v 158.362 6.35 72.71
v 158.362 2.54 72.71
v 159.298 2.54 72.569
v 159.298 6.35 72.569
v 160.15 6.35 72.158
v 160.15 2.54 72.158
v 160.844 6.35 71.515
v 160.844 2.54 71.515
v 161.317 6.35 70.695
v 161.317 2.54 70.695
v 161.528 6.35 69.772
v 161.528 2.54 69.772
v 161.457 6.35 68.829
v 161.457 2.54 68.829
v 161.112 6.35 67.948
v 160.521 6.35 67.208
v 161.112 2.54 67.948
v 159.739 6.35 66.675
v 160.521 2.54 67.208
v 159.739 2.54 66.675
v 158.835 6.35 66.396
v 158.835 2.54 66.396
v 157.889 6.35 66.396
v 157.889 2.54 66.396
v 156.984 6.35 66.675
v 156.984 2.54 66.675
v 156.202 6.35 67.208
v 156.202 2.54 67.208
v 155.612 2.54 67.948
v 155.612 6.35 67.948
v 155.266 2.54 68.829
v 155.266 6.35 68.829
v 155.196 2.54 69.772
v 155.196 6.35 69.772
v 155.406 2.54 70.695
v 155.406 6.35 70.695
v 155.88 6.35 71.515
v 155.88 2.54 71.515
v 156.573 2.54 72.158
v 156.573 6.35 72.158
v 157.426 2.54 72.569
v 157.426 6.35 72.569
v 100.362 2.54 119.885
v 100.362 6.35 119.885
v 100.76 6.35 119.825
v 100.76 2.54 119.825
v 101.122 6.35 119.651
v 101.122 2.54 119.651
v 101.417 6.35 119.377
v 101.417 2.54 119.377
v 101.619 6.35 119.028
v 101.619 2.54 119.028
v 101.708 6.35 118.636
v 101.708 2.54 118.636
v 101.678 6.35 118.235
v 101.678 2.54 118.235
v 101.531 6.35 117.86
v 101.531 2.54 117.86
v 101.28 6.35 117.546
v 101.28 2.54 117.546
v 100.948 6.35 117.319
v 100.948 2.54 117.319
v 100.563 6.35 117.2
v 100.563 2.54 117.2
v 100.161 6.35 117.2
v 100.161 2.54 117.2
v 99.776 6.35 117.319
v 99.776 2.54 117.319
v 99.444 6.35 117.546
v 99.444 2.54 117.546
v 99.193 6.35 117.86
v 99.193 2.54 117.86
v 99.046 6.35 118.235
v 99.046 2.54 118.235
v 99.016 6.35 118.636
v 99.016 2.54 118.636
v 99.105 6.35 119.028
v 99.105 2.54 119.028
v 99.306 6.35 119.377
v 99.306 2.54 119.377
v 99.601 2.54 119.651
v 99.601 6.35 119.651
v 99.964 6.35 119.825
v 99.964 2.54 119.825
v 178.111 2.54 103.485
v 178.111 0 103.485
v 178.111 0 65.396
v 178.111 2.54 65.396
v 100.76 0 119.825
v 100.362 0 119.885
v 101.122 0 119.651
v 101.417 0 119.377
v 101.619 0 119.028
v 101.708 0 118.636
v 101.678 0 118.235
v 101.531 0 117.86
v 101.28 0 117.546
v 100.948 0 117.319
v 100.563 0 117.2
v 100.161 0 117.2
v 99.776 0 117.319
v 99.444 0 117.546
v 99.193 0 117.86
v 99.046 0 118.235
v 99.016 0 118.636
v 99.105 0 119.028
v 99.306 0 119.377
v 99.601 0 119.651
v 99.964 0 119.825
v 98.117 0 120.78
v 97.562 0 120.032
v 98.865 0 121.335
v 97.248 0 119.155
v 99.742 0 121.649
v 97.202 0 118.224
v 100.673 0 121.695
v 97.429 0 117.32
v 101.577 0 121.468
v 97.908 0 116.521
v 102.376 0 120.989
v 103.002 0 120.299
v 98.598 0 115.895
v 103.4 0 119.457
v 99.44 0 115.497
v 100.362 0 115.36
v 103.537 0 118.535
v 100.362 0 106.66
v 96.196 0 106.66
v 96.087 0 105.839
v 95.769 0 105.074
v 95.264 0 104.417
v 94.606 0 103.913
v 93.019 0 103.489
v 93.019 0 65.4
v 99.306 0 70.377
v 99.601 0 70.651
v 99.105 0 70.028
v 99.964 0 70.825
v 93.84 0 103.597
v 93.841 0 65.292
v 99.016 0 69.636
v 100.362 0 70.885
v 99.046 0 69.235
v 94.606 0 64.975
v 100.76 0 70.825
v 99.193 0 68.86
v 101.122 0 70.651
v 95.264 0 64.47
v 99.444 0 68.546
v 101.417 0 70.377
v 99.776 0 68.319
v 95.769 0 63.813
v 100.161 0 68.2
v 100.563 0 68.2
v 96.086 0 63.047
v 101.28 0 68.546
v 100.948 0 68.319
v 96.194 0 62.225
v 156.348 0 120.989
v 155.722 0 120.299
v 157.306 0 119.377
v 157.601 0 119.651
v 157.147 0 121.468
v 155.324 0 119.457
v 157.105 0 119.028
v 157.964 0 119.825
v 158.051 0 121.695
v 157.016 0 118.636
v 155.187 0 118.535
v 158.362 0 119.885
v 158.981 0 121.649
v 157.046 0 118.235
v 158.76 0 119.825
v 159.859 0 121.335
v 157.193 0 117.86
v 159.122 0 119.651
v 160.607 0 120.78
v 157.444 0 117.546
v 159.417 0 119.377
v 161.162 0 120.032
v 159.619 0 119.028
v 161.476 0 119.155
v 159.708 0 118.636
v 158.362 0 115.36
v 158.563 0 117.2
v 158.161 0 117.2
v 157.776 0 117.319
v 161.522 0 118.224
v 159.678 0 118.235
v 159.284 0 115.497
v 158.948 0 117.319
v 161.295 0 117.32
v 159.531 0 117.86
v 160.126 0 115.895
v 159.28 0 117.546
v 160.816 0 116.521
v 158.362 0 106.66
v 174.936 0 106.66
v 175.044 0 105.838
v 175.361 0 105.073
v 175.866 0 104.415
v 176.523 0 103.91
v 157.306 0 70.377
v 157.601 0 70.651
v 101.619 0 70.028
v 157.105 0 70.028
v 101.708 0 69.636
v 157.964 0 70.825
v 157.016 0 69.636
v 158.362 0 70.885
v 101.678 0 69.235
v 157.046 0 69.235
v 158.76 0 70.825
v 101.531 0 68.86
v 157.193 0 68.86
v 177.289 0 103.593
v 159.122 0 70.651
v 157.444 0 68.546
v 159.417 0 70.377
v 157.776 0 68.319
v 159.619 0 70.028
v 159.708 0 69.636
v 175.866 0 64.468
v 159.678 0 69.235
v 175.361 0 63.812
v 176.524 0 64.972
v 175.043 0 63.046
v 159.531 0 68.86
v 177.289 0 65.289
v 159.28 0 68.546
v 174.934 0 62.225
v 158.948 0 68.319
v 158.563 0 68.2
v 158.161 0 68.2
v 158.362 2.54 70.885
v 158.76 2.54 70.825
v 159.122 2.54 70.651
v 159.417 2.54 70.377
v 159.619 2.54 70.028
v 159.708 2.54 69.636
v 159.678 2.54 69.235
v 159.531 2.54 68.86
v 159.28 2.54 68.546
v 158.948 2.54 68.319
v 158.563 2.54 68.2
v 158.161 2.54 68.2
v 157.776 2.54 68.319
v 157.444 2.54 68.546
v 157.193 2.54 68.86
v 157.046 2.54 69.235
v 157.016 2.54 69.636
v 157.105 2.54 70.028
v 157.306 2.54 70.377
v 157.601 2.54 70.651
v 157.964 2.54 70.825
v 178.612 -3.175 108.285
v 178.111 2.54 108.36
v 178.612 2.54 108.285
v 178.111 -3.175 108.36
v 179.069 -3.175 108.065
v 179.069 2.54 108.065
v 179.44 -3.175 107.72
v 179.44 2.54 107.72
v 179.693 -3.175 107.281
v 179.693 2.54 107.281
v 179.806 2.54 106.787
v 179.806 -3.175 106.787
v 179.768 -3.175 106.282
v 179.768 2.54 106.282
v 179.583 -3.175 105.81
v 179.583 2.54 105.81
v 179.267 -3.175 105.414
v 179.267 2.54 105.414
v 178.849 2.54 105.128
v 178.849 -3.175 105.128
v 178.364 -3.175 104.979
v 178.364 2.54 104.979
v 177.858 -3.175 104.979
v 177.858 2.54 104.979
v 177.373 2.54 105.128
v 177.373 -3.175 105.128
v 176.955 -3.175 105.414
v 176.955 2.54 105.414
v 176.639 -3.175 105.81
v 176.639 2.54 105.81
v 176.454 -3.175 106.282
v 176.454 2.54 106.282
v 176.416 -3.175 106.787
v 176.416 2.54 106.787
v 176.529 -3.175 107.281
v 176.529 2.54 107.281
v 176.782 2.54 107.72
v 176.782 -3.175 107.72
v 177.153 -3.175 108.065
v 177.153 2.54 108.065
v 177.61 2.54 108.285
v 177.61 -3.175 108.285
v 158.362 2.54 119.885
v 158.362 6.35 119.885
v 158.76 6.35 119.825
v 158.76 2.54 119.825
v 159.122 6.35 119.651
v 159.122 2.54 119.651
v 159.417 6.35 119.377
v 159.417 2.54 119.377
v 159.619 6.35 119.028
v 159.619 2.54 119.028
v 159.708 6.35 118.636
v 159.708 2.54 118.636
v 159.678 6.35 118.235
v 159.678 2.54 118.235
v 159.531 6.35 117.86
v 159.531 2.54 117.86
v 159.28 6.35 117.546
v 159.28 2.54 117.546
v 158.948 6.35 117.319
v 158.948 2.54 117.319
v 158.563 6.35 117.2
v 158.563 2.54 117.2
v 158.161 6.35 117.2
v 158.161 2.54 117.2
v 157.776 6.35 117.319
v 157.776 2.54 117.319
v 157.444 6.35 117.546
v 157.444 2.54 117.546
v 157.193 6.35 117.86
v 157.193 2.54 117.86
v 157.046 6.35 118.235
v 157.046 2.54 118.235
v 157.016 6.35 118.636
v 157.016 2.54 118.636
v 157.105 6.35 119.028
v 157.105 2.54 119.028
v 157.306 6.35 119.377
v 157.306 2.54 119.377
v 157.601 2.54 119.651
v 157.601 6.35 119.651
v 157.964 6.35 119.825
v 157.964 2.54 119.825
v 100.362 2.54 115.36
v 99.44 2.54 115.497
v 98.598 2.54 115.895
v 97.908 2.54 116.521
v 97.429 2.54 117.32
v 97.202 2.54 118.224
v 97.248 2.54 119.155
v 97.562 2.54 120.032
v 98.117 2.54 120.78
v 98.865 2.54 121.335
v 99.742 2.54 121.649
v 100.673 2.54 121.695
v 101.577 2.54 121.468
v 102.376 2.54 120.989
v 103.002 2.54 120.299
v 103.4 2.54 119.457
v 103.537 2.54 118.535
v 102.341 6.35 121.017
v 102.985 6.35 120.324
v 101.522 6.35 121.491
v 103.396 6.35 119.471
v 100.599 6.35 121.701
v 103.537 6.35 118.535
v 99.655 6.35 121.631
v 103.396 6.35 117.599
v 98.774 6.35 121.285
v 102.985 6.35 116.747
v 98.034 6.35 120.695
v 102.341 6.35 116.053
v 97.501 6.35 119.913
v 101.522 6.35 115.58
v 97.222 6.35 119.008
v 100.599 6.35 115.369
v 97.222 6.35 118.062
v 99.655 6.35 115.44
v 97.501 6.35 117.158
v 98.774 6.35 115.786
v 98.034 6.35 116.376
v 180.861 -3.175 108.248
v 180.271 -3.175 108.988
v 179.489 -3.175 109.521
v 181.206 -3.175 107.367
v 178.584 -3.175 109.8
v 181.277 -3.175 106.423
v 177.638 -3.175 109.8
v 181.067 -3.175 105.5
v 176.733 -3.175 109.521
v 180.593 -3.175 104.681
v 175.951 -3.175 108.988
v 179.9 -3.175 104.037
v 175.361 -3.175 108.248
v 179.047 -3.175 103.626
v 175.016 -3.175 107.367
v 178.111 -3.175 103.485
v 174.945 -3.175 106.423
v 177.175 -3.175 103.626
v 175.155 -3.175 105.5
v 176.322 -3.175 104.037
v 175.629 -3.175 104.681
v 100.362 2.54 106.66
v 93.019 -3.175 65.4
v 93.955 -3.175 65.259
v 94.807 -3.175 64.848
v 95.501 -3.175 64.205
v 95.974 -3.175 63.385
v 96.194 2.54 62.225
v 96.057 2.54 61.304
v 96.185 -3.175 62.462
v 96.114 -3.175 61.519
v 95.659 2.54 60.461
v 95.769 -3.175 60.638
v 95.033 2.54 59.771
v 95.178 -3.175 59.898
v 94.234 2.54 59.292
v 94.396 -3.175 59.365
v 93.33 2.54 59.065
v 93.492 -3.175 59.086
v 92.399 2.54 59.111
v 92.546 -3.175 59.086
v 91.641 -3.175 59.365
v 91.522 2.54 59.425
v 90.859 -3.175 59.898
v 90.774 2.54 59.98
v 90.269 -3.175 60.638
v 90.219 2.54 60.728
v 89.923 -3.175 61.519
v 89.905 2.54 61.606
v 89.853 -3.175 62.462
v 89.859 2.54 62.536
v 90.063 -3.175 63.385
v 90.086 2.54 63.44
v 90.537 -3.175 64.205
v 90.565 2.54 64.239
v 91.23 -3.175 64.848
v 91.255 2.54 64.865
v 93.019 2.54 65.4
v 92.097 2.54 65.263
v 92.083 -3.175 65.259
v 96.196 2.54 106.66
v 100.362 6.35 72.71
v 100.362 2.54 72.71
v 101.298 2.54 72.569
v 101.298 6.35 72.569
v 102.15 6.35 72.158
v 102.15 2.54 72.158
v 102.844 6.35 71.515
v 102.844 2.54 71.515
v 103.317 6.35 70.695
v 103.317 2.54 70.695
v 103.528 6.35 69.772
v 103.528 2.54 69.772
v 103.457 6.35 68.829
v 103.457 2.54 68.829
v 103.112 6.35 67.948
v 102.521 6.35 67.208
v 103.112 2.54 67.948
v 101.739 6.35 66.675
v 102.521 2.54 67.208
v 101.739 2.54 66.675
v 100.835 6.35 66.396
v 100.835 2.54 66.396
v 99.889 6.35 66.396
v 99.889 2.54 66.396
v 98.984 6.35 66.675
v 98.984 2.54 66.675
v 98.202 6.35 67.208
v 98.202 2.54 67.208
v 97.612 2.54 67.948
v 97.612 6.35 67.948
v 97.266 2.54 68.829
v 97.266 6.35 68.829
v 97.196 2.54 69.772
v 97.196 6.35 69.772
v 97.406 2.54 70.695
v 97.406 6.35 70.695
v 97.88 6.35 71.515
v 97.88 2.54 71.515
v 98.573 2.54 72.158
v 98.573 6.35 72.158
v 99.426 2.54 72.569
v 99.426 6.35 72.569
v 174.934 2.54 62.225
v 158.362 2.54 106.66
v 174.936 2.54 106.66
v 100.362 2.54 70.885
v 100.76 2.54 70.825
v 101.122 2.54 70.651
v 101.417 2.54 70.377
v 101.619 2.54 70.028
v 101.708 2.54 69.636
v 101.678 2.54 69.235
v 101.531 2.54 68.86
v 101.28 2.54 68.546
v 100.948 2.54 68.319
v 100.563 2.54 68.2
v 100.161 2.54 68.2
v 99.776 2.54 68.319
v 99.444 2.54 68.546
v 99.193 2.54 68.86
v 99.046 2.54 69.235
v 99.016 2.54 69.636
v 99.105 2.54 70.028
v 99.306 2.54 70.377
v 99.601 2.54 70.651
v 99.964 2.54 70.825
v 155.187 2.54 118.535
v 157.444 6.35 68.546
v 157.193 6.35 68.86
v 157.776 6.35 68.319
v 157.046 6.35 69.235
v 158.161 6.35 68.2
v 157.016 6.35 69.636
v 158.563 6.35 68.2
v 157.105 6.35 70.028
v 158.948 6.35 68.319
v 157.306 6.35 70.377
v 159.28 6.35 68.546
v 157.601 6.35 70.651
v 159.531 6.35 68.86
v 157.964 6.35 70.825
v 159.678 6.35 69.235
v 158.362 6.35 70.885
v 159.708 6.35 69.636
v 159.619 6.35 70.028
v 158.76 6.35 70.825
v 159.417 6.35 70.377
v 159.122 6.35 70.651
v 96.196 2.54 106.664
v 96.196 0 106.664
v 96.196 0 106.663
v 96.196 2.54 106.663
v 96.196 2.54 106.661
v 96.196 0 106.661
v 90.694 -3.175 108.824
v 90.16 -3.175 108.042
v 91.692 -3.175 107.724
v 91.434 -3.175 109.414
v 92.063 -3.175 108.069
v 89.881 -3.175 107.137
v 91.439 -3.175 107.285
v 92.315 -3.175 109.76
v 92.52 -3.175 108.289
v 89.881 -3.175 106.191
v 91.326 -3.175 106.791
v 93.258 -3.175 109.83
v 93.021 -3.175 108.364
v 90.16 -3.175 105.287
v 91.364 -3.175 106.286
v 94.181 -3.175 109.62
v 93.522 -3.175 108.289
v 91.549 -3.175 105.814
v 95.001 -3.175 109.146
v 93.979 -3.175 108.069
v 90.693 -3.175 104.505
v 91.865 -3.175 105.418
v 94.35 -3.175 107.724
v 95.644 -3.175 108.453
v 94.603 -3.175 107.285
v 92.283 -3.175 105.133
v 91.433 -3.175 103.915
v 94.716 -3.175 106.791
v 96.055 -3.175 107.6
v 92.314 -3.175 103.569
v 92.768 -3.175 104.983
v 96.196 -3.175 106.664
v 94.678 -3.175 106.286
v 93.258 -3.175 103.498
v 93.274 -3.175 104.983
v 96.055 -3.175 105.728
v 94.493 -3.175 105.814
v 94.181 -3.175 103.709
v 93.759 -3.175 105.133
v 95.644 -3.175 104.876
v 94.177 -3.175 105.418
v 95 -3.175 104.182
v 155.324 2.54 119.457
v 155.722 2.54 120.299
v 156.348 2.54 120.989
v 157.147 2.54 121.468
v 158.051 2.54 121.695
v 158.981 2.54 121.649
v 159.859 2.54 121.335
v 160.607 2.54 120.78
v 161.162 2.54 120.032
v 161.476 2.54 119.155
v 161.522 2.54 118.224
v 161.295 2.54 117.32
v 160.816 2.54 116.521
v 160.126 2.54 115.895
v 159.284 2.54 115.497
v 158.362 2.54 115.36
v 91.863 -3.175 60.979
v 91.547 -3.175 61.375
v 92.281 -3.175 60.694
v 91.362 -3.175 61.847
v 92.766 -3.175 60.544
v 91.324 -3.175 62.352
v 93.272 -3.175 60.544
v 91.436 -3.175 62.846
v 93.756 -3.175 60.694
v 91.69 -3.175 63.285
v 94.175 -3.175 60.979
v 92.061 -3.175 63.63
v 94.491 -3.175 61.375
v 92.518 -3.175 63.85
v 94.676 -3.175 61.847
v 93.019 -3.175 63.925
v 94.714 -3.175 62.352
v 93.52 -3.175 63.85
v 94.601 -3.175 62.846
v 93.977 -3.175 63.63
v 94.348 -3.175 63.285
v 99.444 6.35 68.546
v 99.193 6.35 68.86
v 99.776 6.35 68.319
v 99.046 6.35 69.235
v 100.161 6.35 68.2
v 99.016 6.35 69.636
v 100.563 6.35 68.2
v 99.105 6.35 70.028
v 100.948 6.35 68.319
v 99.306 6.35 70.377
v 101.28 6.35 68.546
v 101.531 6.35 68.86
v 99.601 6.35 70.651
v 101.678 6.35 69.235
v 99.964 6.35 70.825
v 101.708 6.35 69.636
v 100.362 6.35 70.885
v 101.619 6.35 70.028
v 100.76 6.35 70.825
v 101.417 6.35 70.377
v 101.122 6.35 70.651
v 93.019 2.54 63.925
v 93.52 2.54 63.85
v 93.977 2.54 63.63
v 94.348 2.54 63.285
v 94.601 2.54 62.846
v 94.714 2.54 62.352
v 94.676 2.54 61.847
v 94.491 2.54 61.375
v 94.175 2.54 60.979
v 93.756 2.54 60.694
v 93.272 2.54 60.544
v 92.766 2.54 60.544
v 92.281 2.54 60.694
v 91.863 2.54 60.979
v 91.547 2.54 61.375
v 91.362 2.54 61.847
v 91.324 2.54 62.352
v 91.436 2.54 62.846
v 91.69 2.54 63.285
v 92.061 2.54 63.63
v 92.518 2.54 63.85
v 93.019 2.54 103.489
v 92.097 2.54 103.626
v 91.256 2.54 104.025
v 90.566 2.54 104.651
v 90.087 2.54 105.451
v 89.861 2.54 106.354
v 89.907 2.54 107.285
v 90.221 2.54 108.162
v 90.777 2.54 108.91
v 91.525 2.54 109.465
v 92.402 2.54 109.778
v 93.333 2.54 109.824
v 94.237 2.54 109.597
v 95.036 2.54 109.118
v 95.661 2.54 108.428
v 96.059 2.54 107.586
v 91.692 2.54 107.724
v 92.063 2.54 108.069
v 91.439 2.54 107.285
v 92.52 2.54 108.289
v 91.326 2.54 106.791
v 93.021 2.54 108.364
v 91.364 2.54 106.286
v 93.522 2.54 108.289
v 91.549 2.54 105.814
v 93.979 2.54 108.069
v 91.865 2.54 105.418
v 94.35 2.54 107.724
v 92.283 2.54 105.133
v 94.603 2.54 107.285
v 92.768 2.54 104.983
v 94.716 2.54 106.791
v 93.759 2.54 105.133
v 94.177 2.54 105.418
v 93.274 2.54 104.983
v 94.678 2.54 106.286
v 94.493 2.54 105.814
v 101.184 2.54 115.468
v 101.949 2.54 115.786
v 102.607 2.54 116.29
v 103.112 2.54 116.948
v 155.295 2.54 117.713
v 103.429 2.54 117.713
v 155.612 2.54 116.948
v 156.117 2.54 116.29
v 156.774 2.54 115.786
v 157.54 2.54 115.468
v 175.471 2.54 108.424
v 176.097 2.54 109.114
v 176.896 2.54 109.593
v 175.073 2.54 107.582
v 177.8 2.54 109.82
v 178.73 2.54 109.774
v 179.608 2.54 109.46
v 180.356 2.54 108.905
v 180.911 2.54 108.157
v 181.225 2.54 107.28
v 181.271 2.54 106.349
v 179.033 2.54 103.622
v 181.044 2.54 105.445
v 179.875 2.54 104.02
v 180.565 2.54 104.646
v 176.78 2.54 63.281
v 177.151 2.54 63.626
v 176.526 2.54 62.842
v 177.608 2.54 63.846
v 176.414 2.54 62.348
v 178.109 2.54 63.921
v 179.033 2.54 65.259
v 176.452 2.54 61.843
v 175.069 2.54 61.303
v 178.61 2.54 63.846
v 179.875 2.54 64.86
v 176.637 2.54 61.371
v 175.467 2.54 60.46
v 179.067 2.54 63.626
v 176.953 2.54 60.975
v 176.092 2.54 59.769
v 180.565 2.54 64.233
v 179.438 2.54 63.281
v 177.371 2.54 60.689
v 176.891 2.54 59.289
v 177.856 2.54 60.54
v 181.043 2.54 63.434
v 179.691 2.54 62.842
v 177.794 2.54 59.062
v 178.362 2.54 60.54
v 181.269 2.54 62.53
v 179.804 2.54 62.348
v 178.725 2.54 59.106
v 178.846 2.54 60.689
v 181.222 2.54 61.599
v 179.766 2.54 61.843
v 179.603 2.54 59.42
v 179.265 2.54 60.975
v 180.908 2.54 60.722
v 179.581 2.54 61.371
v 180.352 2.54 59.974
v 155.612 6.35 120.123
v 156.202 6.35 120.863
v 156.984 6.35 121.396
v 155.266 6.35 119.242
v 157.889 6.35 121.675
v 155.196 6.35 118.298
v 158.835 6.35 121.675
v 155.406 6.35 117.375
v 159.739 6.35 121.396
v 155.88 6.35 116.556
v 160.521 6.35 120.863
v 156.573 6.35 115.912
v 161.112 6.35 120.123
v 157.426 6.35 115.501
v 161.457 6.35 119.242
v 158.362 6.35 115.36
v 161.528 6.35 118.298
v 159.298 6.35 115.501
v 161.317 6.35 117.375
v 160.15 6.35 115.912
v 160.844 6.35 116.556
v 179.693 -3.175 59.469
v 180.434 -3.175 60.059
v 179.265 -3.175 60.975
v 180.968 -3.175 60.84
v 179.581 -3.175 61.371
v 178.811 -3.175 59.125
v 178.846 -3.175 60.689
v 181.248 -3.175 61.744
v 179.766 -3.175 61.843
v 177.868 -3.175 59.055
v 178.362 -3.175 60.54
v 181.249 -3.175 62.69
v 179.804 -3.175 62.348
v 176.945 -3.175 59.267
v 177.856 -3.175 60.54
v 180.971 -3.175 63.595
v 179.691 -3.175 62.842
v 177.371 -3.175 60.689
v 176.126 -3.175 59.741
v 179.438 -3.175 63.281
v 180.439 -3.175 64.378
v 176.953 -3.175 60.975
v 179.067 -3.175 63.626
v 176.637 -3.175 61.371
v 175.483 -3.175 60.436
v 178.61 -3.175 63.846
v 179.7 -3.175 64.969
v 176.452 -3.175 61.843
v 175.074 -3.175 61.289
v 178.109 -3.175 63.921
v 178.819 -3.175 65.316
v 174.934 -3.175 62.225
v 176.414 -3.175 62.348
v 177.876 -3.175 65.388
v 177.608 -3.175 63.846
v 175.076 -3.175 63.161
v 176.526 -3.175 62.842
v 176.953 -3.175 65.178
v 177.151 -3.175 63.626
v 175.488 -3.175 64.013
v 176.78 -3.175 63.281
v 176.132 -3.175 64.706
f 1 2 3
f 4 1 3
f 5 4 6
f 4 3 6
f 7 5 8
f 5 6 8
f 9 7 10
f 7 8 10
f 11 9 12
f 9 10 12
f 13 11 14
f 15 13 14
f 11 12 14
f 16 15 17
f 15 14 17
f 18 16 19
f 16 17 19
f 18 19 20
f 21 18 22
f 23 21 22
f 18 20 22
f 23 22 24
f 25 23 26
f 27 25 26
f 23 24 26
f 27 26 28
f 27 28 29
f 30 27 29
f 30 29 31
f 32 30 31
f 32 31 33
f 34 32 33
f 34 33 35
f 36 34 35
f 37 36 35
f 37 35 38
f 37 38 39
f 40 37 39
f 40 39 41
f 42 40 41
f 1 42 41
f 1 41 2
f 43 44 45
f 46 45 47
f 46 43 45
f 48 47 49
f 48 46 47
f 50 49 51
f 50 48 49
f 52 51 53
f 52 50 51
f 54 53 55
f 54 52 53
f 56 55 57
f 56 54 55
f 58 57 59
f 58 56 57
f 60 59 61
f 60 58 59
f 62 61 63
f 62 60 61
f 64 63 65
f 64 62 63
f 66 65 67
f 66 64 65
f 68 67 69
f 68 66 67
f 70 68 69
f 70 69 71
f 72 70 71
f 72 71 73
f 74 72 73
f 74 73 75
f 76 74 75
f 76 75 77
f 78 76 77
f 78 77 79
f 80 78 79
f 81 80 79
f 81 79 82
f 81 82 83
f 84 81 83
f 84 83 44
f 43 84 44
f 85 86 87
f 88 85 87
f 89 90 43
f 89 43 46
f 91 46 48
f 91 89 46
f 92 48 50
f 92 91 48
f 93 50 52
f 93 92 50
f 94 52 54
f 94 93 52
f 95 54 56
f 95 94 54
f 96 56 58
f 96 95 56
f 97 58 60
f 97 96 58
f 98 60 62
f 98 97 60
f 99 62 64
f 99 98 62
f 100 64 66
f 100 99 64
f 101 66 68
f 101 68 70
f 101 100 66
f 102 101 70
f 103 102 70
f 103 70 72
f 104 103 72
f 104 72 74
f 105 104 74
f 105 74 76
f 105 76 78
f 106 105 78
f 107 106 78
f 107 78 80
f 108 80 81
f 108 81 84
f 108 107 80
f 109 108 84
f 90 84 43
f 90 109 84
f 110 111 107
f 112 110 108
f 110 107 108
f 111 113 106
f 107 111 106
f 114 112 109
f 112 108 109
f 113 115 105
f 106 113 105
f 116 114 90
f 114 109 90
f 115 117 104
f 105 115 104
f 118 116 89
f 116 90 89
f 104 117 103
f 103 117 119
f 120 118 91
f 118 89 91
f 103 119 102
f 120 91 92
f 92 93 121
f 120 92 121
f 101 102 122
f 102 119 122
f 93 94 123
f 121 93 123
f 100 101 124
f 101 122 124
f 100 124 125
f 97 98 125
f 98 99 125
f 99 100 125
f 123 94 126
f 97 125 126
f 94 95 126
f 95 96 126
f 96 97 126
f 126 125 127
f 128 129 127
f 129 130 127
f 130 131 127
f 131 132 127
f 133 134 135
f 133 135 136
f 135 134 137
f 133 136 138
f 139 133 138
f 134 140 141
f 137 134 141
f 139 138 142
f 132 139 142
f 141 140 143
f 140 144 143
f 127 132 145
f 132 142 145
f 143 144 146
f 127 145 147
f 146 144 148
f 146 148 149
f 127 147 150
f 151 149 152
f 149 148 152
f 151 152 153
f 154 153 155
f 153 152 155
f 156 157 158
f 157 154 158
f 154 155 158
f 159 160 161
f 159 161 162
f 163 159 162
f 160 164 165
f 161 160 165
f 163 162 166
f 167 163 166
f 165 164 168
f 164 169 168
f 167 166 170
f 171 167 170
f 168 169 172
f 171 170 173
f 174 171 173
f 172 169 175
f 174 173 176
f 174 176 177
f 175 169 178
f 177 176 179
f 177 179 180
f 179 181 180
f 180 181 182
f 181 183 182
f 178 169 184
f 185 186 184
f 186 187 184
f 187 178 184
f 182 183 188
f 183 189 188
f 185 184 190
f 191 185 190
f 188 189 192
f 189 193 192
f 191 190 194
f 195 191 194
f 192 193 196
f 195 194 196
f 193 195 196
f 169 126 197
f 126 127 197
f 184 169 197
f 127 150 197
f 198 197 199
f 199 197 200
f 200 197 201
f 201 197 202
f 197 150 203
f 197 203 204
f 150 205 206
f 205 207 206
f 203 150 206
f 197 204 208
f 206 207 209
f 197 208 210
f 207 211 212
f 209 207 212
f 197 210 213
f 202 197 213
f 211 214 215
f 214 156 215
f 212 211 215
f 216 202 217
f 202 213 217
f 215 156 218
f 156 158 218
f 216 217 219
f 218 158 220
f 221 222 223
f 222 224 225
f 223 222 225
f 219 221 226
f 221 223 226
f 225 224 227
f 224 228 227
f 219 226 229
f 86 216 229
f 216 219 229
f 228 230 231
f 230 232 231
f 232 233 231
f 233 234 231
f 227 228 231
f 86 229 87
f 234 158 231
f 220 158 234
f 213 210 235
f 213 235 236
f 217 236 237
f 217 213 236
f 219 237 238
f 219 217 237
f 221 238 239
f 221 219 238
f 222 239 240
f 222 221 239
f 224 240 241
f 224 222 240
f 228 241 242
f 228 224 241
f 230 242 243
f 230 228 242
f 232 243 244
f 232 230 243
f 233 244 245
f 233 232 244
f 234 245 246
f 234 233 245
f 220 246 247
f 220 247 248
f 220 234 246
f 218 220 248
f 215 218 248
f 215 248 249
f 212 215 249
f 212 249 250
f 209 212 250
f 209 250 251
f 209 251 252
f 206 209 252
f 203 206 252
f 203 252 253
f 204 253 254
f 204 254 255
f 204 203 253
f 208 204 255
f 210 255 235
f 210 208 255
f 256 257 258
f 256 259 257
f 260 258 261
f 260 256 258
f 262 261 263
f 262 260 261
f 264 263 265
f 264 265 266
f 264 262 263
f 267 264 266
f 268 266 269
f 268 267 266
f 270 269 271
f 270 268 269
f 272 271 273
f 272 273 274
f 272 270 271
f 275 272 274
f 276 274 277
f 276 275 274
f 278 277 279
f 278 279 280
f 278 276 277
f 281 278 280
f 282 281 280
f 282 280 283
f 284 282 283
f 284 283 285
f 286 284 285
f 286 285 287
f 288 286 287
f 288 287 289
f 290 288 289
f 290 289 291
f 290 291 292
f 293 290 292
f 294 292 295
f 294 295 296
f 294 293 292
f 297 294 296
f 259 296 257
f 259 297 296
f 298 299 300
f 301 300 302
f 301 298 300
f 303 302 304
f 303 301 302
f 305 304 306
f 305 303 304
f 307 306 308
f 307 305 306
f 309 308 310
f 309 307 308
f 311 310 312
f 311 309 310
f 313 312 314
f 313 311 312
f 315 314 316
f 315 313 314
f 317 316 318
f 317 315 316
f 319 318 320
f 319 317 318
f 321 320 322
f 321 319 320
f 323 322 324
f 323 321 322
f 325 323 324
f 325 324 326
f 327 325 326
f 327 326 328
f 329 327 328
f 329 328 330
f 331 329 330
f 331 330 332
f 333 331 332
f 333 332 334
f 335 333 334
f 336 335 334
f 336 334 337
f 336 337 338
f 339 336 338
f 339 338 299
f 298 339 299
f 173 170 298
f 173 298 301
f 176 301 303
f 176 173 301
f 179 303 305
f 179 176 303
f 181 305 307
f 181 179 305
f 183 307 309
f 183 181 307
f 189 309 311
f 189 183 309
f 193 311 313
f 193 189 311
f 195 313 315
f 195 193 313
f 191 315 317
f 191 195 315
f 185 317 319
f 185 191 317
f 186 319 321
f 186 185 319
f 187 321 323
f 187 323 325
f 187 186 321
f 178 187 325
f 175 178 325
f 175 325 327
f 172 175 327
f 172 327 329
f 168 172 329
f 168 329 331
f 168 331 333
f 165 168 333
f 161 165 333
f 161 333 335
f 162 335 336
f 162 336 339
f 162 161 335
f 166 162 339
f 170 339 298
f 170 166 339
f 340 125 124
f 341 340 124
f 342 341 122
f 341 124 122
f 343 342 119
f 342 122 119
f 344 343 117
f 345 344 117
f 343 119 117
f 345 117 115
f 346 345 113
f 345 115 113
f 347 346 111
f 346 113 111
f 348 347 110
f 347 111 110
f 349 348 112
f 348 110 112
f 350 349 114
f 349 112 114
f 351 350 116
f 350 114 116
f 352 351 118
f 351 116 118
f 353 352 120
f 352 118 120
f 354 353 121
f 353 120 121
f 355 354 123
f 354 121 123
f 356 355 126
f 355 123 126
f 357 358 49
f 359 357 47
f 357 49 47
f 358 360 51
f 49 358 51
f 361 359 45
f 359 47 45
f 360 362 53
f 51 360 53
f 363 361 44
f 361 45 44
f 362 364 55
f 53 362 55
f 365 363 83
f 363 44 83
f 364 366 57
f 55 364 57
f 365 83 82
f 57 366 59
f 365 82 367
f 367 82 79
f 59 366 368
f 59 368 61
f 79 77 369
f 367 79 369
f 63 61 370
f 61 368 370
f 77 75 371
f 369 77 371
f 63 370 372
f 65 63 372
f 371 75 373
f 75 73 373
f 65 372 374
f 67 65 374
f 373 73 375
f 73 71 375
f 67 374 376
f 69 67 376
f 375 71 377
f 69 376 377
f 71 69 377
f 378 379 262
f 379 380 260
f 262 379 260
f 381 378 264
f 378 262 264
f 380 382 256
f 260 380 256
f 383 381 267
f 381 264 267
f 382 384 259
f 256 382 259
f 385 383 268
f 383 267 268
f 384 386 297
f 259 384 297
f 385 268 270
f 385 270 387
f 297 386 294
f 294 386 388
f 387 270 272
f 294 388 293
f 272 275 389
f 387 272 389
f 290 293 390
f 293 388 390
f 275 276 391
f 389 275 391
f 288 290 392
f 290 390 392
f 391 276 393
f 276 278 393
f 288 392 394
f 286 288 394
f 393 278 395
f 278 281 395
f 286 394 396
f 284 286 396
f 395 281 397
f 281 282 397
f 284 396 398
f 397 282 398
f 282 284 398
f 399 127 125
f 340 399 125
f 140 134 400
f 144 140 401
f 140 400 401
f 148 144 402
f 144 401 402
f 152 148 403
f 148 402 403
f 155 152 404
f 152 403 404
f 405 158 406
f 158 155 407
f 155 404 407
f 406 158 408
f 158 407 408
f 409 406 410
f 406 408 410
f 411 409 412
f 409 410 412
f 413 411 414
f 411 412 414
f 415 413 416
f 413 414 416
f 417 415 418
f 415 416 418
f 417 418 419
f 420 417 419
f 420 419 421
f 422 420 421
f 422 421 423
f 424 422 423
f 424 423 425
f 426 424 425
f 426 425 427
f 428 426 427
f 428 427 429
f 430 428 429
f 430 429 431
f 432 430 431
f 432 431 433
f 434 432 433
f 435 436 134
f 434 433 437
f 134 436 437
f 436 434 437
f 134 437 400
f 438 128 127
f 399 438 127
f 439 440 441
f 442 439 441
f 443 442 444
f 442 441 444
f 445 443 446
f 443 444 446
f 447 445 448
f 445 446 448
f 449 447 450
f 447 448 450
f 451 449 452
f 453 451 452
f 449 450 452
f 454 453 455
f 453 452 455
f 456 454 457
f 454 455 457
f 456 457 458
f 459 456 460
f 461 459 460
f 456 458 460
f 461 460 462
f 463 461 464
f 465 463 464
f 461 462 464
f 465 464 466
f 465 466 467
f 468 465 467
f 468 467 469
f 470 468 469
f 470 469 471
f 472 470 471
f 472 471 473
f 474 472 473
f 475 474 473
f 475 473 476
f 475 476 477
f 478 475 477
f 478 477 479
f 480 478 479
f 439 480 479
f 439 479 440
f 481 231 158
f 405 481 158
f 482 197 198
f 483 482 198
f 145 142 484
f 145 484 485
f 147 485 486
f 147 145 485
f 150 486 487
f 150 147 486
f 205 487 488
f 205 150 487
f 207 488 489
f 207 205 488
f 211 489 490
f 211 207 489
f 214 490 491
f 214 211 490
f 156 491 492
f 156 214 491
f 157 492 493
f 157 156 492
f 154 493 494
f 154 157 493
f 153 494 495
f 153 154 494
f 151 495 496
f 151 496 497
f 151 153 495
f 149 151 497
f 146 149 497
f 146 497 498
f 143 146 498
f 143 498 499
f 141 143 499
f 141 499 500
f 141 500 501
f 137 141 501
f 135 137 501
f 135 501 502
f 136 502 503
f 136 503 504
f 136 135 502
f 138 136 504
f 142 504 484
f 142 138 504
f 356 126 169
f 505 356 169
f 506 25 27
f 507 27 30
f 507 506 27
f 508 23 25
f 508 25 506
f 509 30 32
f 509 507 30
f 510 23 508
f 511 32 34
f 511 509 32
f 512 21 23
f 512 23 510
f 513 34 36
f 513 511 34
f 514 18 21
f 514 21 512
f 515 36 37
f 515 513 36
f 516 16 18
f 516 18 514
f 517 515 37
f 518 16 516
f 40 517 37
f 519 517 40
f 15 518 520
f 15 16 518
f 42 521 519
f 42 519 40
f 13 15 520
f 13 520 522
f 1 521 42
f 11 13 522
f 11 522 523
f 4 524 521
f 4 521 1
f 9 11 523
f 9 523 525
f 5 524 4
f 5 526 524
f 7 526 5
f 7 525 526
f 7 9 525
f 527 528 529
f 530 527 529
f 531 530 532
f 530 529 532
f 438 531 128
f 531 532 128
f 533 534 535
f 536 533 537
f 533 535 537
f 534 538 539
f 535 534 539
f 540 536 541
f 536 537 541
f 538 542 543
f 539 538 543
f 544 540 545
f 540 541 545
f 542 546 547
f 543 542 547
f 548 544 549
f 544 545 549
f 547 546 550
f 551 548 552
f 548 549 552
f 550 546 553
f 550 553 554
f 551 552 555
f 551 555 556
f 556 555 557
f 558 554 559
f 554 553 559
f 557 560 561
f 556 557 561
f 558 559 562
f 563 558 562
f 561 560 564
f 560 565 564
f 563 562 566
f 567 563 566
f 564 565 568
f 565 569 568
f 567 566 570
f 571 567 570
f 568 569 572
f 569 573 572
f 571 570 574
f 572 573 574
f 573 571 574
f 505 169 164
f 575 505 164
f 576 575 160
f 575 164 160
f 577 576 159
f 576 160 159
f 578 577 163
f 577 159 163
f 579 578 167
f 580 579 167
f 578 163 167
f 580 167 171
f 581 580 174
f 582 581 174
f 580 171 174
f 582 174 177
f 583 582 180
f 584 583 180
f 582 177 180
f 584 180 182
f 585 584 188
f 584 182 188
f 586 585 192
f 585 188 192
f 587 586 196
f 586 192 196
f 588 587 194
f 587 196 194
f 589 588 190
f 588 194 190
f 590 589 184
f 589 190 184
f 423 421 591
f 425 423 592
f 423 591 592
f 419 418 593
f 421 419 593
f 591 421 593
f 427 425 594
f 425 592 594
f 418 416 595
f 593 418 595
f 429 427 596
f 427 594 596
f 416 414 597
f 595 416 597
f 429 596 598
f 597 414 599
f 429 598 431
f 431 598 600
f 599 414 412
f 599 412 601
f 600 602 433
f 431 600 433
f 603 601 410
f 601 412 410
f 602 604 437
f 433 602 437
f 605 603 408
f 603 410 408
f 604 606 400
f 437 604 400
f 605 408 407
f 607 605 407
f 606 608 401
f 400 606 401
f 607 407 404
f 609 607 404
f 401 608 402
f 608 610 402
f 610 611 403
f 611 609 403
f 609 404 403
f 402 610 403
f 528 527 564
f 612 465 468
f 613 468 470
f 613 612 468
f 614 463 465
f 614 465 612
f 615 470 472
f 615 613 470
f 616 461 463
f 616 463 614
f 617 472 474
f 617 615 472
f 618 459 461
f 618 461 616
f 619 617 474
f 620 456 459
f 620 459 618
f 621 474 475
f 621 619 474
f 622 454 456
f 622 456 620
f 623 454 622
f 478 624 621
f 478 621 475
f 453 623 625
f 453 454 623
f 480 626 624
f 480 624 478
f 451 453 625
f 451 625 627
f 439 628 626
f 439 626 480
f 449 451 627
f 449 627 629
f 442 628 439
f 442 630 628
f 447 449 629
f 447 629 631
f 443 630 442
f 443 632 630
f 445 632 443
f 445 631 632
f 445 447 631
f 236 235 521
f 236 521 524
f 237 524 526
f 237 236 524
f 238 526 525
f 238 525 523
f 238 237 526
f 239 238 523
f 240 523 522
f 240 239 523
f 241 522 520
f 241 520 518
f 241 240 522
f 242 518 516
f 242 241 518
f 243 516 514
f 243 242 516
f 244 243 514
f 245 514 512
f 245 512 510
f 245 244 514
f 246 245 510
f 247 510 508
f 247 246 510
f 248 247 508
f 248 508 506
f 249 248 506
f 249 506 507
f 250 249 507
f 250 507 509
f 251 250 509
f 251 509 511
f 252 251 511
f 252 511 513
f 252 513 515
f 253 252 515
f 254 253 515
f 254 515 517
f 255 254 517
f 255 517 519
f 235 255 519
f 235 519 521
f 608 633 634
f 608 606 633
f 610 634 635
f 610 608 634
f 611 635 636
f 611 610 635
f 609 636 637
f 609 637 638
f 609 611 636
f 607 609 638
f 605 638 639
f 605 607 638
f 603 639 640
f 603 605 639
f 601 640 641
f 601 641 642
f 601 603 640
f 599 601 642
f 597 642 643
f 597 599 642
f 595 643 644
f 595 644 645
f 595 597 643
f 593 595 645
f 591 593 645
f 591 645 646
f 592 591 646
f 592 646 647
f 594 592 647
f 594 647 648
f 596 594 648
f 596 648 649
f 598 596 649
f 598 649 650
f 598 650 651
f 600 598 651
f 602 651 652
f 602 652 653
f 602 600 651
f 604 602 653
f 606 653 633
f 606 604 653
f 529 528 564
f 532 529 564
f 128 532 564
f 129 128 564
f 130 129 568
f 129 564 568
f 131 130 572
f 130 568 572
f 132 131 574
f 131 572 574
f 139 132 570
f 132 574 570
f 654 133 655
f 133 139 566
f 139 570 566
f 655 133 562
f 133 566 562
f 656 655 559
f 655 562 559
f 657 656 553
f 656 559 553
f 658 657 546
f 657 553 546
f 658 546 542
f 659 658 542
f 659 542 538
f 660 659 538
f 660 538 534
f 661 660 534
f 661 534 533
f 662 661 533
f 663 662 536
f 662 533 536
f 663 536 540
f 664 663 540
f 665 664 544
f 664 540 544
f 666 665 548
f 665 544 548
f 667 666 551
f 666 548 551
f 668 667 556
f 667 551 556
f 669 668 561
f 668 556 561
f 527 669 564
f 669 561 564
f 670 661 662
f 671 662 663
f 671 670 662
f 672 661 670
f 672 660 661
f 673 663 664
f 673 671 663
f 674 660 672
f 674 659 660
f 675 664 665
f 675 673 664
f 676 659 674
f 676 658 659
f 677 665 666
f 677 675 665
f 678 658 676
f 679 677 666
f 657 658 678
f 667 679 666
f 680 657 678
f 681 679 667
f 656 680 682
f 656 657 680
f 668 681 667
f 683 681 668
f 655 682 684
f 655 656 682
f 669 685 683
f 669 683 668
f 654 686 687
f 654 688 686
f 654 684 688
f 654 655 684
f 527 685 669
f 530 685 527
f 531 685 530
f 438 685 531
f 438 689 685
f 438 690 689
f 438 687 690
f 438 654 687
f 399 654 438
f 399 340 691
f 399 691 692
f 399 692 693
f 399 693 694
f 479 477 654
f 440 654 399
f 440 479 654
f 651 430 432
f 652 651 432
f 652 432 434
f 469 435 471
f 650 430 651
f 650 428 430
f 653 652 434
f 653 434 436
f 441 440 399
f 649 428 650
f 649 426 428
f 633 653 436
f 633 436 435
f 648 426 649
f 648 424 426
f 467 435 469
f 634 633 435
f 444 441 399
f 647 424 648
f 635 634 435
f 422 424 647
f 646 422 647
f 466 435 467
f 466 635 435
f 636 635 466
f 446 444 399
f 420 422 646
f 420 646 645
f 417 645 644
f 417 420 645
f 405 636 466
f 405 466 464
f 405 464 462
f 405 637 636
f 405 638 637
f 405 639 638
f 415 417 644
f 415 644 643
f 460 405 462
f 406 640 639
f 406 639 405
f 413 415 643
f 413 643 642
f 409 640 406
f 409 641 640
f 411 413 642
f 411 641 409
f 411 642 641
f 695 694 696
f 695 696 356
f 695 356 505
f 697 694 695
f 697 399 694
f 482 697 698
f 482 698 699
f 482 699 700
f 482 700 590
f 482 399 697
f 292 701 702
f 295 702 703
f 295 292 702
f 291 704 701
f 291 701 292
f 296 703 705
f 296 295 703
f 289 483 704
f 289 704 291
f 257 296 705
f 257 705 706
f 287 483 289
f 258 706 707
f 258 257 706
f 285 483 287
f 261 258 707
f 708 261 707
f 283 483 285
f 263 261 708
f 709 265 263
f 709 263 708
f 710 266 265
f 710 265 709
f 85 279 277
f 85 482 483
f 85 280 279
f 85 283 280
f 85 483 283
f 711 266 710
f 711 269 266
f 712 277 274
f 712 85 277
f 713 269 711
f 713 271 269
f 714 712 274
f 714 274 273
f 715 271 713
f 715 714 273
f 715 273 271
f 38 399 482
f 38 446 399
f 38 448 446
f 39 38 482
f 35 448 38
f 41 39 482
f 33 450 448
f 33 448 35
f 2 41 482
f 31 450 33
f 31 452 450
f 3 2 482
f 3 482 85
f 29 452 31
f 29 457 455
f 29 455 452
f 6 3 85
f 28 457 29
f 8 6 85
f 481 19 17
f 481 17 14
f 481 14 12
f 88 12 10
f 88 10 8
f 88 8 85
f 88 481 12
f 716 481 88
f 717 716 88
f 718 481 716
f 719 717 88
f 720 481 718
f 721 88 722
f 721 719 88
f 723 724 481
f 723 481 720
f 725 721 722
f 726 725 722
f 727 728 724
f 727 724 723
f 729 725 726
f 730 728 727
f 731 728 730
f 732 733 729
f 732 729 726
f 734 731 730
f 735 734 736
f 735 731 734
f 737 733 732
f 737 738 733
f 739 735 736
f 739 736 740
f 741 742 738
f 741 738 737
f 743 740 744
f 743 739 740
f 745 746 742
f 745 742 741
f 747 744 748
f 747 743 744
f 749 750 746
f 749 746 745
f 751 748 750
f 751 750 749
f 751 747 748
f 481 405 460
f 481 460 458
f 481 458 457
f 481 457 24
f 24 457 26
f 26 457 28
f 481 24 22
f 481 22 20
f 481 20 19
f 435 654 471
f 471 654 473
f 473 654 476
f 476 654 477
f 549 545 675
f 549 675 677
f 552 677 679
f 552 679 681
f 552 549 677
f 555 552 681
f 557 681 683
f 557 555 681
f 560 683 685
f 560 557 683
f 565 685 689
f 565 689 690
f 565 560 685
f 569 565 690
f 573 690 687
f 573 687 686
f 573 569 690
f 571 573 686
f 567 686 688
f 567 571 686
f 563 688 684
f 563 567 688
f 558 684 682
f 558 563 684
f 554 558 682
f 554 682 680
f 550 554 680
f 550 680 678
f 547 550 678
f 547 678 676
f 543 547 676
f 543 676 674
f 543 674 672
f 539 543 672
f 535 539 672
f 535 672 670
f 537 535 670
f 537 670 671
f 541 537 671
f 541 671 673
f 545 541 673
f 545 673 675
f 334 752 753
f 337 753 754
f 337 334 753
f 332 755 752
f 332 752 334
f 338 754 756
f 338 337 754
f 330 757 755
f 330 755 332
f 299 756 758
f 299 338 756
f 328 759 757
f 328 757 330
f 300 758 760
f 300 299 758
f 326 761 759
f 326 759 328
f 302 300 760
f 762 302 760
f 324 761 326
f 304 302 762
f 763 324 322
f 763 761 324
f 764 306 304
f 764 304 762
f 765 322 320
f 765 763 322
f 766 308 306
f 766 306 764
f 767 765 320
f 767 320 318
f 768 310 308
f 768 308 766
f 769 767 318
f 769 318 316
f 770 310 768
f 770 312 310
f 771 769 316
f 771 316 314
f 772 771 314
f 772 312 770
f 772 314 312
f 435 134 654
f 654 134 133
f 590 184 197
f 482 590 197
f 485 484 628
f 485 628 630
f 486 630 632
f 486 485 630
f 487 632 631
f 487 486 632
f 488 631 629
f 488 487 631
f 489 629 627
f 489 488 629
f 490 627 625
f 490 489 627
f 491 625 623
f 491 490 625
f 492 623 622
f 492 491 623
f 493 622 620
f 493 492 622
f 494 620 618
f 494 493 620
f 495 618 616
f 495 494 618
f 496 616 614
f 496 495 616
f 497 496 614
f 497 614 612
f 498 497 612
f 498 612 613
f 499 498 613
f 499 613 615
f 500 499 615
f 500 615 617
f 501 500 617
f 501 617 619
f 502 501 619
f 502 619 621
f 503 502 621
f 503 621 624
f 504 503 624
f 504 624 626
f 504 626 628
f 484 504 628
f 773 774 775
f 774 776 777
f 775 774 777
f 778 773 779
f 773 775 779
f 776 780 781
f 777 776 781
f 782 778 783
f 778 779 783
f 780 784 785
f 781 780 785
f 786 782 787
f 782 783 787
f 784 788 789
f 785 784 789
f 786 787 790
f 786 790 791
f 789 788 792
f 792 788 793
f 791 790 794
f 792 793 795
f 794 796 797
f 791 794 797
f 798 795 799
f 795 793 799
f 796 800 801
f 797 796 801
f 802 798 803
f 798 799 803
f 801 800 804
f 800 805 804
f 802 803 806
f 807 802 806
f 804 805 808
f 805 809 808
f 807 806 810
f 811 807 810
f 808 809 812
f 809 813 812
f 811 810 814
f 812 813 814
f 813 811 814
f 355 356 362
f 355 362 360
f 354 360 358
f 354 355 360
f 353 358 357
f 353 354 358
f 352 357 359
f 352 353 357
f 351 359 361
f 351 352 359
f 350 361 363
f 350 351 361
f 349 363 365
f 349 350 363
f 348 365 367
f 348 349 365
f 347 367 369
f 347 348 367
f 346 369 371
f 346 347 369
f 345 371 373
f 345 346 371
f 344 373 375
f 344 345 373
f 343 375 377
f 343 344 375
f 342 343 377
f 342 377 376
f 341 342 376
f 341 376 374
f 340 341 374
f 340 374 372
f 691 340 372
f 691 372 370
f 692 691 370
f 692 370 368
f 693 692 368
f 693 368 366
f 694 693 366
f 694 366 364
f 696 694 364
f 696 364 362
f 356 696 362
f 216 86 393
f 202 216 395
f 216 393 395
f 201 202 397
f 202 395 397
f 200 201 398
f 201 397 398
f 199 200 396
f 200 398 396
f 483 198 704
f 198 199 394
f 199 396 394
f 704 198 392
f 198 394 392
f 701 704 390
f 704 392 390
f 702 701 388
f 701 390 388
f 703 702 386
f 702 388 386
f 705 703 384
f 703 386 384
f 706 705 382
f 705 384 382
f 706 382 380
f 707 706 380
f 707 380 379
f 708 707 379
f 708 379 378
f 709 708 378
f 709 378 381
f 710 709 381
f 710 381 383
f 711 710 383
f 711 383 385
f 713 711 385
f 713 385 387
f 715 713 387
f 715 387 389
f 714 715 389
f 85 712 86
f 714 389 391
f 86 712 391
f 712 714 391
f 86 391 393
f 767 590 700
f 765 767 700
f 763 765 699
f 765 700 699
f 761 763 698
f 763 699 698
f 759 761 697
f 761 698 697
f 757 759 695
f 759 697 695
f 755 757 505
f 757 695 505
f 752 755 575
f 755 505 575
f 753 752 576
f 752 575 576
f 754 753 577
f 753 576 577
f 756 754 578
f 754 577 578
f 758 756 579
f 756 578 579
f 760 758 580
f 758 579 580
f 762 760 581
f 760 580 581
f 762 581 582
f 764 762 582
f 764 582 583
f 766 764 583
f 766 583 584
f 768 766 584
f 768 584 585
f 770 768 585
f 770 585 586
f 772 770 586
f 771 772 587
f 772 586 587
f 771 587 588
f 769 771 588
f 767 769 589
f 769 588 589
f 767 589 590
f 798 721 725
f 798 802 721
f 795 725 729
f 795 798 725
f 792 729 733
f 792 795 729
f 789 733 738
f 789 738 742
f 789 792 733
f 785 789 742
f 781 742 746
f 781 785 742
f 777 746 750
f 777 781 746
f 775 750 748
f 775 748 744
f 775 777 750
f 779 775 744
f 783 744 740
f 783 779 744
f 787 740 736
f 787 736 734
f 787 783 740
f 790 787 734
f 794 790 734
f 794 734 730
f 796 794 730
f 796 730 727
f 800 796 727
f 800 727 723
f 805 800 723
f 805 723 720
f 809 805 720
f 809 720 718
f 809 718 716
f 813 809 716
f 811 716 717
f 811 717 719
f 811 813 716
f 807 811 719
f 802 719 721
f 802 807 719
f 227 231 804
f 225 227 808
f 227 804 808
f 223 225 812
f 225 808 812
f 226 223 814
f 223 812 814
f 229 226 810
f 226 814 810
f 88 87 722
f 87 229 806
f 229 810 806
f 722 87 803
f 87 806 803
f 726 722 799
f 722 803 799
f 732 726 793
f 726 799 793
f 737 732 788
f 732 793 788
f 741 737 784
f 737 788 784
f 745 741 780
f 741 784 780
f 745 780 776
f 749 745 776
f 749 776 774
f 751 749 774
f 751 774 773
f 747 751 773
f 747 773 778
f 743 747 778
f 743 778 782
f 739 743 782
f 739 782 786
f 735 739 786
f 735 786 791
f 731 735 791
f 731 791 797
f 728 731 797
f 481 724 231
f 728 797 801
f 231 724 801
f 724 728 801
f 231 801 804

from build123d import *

# Parameters (mm, degrees)
SKETCH3_R           = 1.7
SKETCH3_R_2         = 1.35
BOSS_EXTRUDE2_DEPTH = 2.54
BOSS_EXTRUDE3_START = -3.175
SKETCH3_3_R         = 1.7
SKETCH3_3_R_2       = 3.175
BOSS_EXTRUDE3_DEPTH = 3.175
SKETCH3_4_R         = 3.175
SKETCH3_4_R_2       = 1.35
BOSS_EXTRUDE4_DEPTH = 6.35


with BuildPart() as part:
    # Sketch3 → Boss-Extrude2 (new body)
    with BuildSketch(Plane(origin=(0, 0, 0), x_dir=(1, 0, 0), z_dir=(0, 1, 0))):
        with BuildLine():
            Line((96.195997268, -106.660124546), (100.361892412, -106.660124546))
            Line((100.361892412, -106.660124546), (100.361892412, -115.360172993))
            ThreePointArc((100.361892412, -115.360172993), (98.116828382, -120.780237023), (103.536892412, -118.535172993))
            Line((103.536892412, -118.535172993), (155.186892412, -118.535172993))
            ThreePointArc((155.186892412, -118.535172993), (160.606956442, -120.780237023), (158.361892412, -115.360172993))
            Line((158.361892412, -115.360172993), (158.361892412, -106.660124546))
            Line((158.361892412, -106.660124546), (174.935999752, -106.660124546))
            ThreePointArc((174.935999752, -106.660124546), (180.356063783, -108.905188576), (178.110999752, -103.485124546))
            Line((178.110999752, -103.485124546), (178.110999752, -65.396123892))
            ThreePointArc((178.110999752, -65.396123892), (180.351769569, -59.973882777), (174.933888023, -62.225172993))
            Line((174.933888023, -62.225172993), (96.193885538, -62.225172993))
            ThreePointArc((96.193885538, -62.225172993), (90.773821508, -59.980108963), (93.018885538, -65.400172993))
            Line((93.018885538, -65.400172993), (93.018885538, -103.489173646))
            ThreePointArc((93.018885538, -103.489173646), (90.776683465, -108.90998437), (96.195999849, -106.664172943))
            Line((96.195999849, -106.664172943), (96.195999845, -106.664021883))
            ThreePointArc((96.195999845, -106.664021883), (96.195999154, -106.662073214), (96.195997268, -106.660124546))
        make_face()
        with Locations((93.020999849, -106.664172943)):
            Circle(SKETCH3_R, mode=Mode.SUBTRACT)
        with Locations((93.018885538, -62.225172993)):
            Circle(SKETCH3_R, mode=Mode.SUBTRACT)
        with Locations((178.108885442, -62.221124596)):
            Circle(SKETCH3_R, mode=Mode.SUBTRACT)
        with Locations((178.110999752, -106.660124546)):
            Circle(SKETCH3_R, mode=Mode.SUBTRACT)
        with Locations((158.361892412, -118.535172993)):
            Circle(SKETCH3_R_2, mode=Mode.SUBTRACT)
        with Locations((100.361892412, -118.535172993)):
            Circle(SKETCH3_R_2, mode=Mode.SUBTRACT)
        with Locations((100.361892412, -69.535172993)):
            Circle(SKETCH3_R_2, mode=Mode.SUBTRACT)
        with Locations((158.361892412, -69.535172993)):
            Circle(SKETCH3_R_2, mode=Mode.SUBTRACT)
    extrude(amount=BOSS_EXTRUDE2_DEPTH)

    # Sketch3<3> → Boss-Extrude3 (add)
    # profile 1 of 4: a face of its own
    with BuildSketch(Plane(origin=(0, 0, 0), x_dir=(1, 0, 0), z_dir=(0, 1, 0)).offset(BOSS_EXTRUDE3_START)):
        with BuildLine():
            ThreePointArc((96.195999845, -106.664021883), (89.84599985, -106.664248472), (96.195999849, -106.664172943))
            Line((96.195999849, -106.664172943), (96.195999845, -106.664021883))
        make_face()
        with Locations((93.020999849, -106.664172943)):
            Circle(SKETCH3_3_R, mode=Mode.SUBTRACT)
    # profile 2 of 4: a face of its own
    with BuildSketch(Plane(origin=(0, 0, 0), x_dir=(1, 0, 0), z_dir=(0, 1, 0)).offset(BOSS_EXTRUDE3_START)):
        with Locations((93.018885538, -62.225172993)):
            Circle(SKETCH3_3_R_2)
        with Locations((93.018885538, -62.225172993)):
            Circle(SKETCH3_3_R, mode=Mode.SUBTRACT)
    # profile 3 of 4: a face of its own
    with BuildSketch(Plane(origin=(0, 0, 0), x_dir=(1, 0, 0), z_dir=(0, 1, 0)).offset(BOSS_EXTRUDE3_START)):
        with Locations((178.108885442, -62.221124596)):
            Circle(SKETCH3_3_R_2)
        with Locations((178.108885442, -62.221124596)):
            Circle(SKETCH3_3_R, mode=Mode.SUBTRACT)
    # profile 4 of 4: a face of its own
    with BuildSketch(Plane(origin=(0, 0, 0), x_dir=(1, 0, 0), z_dir=(0, 1, 0)).offset(BOSS_EXTRUDE3_START)):
        with Locations((178.110999752, -106.660124546)):
            Circle(SKETCH3_3_R_2)
        with Locations((178.110999752, -106.660124546)):
            Circle(SKETCH3_3_R, mode=Mode.SUBTRACT)
    extrude(amount=BOSS_EXTRUDE3_DEPTH)

    # Sketch3<4> → Boss-Extrude4 (add)
    # profile 1 of 4: a face of its own
    with BuildSketch(Plane(origin=(0, 0, 0), x_dir=(1, 0, 0), z_dir=(0, 1, 0))):
        with Locations((100.361892412, -118.535172993)):
            Circle(SKETCH3_4_R)
        with Locations((100.361892412, -118.535172993)):
            Circle(SKETCH3_4_R_2, mode=Mode.SUBTRACT)
    # profile 2 of 4: a face of its own
    with BuildSketch(Plane(origin=(0, 0, 0), x_dir=(1, 0, 0), z_dir=(0, 1, 0))):
        with Locations((158.361892412, -118.535172993)):
            Circle(SKETCH3_4_R)
        with Locations((158.361892412, -118.535172993)):
            Circle(SKETCH3_4_R_2, mode=Mode.SUBTRACT)
    # profile 3 of 4: a face of its own
    with BuildSketch(Plane(origin=(0, 0, 0), x_dir=(1, 0, 0), z_dir=(0, 1, 0))):
        with Locations((100.361892412, -69.535172993)):
            Circle(SKETCH3_4_R)
        with Locations((100.361892412, -69.535172993)):
            Circle(SKETCH3_4_R_2, mode=Mode.SUBTRACT)
    # profile 4 of 4: a face of its own
    with BuildSketch(Plane(origin=(0, 0, 0), x_dir=(1, 0, 0), z_dir=(0, 1, 0))):
        with Locations((158.361892412, -69.535172993)):
            Circle(SKETCH3_4_R)
        with Locations((158.361892412, -69.535172993)):
            Circle(SKETCH3_4_R_2, mode=Mode.SUBTRACT)
    extrude(amount=BOSS_EXTRUDE4_DEPTH)


solid = part.part
